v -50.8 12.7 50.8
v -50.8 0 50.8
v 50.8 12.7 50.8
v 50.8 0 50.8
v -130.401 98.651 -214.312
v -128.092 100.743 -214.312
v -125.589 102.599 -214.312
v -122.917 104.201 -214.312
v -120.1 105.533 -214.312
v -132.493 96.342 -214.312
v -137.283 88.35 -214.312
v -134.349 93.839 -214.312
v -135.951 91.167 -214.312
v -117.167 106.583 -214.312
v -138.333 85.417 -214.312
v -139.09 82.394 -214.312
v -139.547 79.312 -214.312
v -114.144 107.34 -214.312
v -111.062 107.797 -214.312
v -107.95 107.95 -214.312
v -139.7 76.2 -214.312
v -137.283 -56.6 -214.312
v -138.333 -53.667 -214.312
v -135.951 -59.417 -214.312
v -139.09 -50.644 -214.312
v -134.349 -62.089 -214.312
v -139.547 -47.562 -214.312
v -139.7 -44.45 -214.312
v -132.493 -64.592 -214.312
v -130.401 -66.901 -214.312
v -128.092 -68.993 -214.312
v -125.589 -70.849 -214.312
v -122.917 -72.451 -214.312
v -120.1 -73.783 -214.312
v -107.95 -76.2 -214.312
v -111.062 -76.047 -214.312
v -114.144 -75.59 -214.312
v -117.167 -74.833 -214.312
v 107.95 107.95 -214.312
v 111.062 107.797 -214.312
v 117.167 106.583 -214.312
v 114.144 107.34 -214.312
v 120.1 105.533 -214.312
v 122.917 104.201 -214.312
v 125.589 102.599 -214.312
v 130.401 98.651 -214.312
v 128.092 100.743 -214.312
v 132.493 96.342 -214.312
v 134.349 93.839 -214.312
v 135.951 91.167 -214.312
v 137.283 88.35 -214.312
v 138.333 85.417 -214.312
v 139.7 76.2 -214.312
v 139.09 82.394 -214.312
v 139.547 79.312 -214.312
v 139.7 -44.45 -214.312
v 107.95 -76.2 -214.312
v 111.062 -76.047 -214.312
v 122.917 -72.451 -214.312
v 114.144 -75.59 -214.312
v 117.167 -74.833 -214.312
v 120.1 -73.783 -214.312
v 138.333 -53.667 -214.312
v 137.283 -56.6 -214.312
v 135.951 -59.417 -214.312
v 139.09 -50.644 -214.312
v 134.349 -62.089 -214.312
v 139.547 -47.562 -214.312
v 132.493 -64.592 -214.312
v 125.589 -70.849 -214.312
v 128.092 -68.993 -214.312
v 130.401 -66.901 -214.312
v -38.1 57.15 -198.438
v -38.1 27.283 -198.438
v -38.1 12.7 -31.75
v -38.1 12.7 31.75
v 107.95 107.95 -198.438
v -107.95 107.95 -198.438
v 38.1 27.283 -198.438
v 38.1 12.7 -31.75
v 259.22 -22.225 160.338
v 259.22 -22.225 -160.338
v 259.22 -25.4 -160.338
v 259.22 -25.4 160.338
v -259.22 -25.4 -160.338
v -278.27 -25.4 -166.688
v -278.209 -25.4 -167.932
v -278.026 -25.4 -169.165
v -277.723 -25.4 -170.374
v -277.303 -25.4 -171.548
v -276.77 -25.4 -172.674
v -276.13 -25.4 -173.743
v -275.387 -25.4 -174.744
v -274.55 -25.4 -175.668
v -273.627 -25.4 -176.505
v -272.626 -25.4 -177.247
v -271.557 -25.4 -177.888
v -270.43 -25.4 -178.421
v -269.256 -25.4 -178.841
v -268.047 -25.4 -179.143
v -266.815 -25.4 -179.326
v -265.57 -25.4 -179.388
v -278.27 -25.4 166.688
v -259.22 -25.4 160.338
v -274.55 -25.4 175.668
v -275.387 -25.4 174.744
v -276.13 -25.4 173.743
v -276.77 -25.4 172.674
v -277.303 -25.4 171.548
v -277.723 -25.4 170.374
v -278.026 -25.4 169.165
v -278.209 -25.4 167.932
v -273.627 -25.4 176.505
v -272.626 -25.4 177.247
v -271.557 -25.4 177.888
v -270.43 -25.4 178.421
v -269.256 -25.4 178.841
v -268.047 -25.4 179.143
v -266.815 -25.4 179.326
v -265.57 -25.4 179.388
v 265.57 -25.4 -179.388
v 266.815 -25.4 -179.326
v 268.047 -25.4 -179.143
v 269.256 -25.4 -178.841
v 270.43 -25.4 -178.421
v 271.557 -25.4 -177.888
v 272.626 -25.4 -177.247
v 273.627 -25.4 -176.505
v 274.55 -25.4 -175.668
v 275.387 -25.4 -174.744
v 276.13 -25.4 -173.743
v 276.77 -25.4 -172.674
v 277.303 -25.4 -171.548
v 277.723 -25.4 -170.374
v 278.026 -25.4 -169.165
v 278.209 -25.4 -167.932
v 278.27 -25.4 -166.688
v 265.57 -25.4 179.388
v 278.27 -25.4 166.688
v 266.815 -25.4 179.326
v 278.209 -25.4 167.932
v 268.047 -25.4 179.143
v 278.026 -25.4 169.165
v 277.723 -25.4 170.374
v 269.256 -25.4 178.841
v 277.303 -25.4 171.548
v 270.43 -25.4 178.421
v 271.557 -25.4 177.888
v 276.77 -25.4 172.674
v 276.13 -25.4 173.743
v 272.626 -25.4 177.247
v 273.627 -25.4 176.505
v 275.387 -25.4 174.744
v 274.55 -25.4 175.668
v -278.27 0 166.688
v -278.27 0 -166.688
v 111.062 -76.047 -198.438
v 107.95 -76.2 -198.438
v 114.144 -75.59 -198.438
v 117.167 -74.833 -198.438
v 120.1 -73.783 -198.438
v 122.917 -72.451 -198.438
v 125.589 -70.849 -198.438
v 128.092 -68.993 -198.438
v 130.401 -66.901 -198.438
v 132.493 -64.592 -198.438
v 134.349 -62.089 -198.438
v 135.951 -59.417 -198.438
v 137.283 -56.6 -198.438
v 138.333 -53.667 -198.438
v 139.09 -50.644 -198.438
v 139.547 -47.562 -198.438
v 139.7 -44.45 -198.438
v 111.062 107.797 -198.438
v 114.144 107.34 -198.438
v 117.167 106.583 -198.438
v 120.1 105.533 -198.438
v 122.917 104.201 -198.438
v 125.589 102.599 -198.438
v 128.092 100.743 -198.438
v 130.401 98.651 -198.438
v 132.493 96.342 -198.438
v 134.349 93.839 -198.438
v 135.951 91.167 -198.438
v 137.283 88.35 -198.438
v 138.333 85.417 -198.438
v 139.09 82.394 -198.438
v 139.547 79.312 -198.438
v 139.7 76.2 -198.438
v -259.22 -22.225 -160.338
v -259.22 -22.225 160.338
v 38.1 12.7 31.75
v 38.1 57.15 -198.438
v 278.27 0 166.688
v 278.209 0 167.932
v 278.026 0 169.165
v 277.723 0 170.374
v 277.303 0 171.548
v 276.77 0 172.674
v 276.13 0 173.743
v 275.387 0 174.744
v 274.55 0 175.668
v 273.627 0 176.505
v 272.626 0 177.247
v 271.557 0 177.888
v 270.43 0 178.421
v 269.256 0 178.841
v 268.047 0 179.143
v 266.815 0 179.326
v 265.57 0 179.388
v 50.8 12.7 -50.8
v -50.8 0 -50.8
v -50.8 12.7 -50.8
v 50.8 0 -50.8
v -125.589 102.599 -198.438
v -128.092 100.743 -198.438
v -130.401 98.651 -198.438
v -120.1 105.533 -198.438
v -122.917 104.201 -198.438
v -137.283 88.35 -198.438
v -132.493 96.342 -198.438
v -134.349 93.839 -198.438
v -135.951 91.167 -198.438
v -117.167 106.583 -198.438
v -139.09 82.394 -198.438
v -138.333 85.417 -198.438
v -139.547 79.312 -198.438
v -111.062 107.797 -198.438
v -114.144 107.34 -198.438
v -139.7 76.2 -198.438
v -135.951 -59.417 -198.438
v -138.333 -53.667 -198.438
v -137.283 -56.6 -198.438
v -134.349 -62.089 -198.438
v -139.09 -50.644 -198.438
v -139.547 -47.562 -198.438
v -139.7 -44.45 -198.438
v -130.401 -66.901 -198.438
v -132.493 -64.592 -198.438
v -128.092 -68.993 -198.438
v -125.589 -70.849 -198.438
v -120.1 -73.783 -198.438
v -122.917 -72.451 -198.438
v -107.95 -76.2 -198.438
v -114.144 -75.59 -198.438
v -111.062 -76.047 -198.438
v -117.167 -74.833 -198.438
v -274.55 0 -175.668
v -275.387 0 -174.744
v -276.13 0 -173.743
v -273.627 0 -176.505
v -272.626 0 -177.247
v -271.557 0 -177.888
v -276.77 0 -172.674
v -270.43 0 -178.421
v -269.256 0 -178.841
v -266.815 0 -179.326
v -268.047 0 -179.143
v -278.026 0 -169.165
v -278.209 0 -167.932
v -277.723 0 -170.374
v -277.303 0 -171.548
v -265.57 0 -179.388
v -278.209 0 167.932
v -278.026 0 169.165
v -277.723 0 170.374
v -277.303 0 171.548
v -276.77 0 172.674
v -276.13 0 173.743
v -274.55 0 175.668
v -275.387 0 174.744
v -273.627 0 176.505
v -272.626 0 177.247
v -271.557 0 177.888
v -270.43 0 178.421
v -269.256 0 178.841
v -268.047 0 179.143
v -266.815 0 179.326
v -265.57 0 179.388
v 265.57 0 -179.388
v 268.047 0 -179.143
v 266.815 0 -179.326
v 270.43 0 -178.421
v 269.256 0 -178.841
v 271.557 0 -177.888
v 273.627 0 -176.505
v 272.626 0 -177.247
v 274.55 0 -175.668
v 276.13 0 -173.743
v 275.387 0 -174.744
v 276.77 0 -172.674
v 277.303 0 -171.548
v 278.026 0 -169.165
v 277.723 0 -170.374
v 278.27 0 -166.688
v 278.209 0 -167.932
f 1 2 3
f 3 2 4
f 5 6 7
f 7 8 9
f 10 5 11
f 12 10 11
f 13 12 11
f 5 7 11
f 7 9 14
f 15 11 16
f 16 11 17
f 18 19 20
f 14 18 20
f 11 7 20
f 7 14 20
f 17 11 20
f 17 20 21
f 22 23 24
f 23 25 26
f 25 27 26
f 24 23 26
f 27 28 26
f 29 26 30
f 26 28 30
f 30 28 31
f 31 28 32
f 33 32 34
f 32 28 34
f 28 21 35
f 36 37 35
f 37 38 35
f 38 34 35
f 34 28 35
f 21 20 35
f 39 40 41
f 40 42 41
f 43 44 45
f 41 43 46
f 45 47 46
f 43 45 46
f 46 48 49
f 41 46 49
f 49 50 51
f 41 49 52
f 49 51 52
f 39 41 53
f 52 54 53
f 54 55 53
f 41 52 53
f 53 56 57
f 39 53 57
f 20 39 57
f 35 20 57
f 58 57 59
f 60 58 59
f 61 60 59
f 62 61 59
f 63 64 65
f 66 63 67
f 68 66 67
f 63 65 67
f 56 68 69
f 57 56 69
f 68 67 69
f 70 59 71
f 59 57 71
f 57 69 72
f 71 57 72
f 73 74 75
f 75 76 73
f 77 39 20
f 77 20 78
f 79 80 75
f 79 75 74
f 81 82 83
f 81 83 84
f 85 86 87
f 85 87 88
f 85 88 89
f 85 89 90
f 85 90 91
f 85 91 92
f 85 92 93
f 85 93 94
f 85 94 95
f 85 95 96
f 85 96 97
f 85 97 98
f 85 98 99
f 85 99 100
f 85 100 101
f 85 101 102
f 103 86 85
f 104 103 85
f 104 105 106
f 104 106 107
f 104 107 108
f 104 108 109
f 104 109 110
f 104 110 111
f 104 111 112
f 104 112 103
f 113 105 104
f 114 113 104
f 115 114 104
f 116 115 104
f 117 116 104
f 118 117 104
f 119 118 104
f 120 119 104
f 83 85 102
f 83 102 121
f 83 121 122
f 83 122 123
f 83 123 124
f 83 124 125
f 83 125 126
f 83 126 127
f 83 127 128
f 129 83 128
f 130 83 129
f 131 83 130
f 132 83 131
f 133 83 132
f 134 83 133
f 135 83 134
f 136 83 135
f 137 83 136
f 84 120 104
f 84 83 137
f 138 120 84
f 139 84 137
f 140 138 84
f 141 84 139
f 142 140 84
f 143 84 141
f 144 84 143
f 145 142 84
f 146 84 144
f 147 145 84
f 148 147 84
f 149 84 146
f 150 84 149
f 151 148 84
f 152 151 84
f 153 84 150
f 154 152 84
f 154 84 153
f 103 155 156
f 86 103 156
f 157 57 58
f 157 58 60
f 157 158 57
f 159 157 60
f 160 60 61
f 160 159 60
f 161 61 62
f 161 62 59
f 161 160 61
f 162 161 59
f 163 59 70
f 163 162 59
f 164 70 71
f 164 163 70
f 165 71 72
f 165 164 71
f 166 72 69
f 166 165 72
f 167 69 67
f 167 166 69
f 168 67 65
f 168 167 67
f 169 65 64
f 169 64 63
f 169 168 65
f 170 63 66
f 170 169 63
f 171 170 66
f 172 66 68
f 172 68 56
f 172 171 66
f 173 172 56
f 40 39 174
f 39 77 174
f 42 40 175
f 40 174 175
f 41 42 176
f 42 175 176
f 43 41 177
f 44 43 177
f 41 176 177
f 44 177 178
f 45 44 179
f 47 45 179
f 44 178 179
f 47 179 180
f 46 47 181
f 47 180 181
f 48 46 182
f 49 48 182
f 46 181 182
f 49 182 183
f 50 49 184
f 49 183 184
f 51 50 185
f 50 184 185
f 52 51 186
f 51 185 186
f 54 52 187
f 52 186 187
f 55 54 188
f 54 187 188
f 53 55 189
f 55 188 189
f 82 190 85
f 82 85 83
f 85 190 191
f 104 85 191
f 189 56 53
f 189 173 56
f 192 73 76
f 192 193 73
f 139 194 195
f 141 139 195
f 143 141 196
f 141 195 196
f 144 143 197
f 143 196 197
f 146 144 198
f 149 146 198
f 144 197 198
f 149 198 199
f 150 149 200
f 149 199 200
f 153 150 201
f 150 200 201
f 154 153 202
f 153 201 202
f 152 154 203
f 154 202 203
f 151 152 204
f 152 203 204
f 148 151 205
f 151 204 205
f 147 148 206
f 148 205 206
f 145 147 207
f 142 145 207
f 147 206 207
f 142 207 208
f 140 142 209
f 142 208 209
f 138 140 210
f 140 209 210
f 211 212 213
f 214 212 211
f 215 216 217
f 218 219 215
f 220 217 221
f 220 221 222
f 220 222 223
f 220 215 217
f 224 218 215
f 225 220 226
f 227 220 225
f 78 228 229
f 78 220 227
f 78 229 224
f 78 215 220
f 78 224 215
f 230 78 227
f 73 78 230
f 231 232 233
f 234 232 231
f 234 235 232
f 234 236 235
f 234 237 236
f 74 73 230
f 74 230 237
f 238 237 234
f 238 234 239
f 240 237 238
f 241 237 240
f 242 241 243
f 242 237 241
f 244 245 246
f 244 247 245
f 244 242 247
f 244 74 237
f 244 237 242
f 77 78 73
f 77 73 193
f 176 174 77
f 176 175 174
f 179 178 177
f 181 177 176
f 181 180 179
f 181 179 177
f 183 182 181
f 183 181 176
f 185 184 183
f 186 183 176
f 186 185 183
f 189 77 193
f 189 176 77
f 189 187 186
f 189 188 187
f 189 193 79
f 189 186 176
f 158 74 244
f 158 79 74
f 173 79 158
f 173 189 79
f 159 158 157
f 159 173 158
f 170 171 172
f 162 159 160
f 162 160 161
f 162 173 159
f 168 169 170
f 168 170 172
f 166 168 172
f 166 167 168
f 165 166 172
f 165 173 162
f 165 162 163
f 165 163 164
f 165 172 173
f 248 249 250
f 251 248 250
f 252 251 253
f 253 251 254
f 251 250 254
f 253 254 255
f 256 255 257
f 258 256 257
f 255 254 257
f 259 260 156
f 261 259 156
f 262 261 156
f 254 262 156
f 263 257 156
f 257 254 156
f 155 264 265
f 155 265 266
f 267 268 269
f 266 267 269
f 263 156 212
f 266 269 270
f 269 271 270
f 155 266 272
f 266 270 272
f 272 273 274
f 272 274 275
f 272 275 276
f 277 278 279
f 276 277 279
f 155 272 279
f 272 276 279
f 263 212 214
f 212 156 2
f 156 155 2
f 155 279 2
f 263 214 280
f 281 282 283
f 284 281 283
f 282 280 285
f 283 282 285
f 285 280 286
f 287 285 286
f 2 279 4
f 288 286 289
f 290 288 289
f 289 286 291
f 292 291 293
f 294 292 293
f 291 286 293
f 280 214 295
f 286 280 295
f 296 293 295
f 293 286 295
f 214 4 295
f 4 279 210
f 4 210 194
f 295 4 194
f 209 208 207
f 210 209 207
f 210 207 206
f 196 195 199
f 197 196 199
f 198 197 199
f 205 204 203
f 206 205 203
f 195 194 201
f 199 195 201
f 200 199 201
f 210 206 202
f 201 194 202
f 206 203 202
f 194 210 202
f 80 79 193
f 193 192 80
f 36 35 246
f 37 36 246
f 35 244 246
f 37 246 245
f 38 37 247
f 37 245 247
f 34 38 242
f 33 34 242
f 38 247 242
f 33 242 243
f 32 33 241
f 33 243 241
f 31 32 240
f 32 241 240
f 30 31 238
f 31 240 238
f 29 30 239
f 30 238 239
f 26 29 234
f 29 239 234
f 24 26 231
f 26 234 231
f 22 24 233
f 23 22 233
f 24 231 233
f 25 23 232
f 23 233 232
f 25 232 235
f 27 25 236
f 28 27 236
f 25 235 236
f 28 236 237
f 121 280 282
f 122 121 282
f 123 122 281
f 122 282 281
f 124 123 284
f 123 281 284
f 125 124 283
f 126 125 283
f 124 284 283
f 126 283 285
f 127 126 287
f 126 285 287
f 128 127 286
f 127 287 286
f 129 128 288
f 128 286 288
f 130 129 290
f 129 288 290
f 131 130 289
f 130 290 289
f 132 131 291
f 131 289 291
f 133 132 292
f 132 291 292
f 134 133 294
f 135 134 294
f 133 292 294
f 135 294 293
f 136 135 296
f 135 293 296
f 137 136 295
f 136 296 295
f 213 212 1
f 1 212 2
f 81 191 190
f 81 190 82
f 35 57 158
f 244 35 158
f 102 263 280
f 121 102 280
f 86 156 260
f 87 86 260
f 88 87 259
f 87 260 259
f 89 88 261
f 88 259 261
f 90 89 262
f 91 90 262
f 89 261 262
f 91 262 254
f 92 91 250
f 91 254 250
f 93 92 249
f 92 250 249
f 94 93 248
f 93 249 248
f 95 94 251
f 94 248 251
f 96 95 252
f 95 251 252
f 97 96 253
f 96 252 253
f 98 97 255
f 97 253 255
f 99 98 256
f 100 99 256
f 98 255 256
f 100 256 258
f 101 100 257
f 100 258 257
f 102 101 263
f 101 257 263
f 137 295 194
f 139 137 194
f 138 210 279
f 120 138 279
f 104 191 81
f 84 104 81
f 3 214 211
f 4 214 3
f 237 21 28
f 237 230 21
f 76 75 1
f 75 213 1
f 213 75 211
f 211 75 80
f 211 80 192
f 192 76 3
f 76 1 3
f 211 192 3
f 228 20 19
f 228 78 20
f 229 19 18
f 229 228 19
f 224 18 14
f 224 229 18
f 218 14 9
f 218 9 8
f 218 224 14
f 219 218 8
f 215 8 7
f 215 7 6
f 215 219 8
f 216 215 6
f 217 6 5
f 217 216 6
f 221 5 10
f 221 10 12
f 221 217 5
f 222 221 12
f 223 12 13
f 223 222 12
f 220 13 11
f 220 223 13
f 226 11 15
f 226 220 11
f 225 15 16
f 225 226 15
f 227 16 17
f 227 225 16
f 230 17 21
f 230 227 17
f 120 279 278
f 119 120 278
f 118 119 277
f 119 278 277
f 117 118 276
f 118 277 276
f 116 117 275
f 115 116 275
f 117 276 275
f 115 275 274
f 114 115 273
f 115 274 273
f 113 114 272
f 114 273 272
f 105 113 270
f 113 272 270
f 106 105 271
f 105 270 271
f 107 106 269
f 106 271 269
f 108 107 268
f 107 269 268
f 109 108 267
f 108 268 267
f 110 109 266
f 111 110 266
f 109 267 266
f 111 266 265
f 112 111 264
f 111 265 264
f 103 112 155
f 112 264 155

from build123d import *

# Parameters (mm, degrees)
F0_W      = 518.439682
F0_H      = 320.675
F1_DEPTH  = 25.4
F2_DEPTH  = 22.225
F3_W      = 101.6
F3_H      = 101.6
F4_DEPTH  = 12.7
F6_DEPTH  = 38.1
F7_W      = 184.15
F7_H      = 15.875
F8_DEPTH  = 101.6
F9_W      = 184.15
F9_H      = 15.875
F10_DEPTH = 101.6
F11_R     = 31.75


with BuildPart() as f1:
    # F0 (on Front) → F1 (new body)
    with BuildSketch(Plane.XZ):
        with BuildLine():
            Line((278.269841, -166.6875), (278.269841, 166.6875))
            ThreePointArc((278.269841, 166.6875), (274.550097, 175.667756), (265.569841, 179.3875))
            Line((265.569841, 179.3875), (-265.569841, 179.3875))
            ThreePointArc((-265.569841, 179.3875), (-274.550097, 175.667756), (-278.269841, 166.6875))
            Line((-278.269841, 166.6875), (-278.269841, -166.6875))
            ThreePointArc((-278.269841, -166.6875), (-274.550097, -175.667756), (-265.569841, -179.3875))
            Line((-265.569841, -179.3875), (265.569841, -179.3875))
            ThreePointArc((265.569841, -179.3875), (274.550097, -175.667756), (278.269841, -166.6875))
        make_face()
        Rectangle(F0_W, F0_H, mode=Mode.SUBTRACT)
    extrude(amount=F1_DEPTH)

    # F0 (on Front) → F2 (join)
    with BuildSketch(Plane.XZ):
        Rectangle(F0_W, F0_H)
    extrude(amount=F2_DEPTH)

    # F3 (on face) → F4 (join)
    with BuildSketch(Plane.XZ):
        Rectangle(F3_W, F3_H)
    extrude(amount=-F4_DEPTH)

    # F5 (on Right) → F6 (join, symmetric)
    with BuildSketch(Plane.YZ):
        Polygon((12.7, 31.75), (12.7, -31.75), (27.283267, -198.4375), (-76.2, -198.4375), (-76.2, -214.3125), (107.95, -214.3125), (107.95, -198.4375), (57.15, -198.4375), align=None)
    extrude(amount=F6_DEPTH, both=True)

    # F7 (on face) → F8 (join)
    with BuildSketch(Plane.YZ.offset(38.1)):
        with Locations((15.875, -206.375)):
            Rectangle(F7_W, F7_H)
    extrude(amount=F8_DEPTH)

    # F9 (on face) → F10 (join)
    with BuildSketch(Plane(origin=(-38.1, 0, 0), x_dir=(0, -1, 0), z_dir=(-1, 0, 0))):
        with Locations((-15.875, -206.375)):
            Rectangle(F9_W, F9_H)
    extrude(amount=F10_DEPTH)

    # F11
    f11_edges = [f1.edges().sort_by_distance(p)[0] for p in [
        (-139.7, 107.95, -206.375),
        (139.7, 107.95, -206.375),
        (139.7, -76.2, -206.375),
        (-139.7, -76.2, -206.375),
    ]]
    fillet(f11_edges, radius=F11_R)


solid = f1.part
